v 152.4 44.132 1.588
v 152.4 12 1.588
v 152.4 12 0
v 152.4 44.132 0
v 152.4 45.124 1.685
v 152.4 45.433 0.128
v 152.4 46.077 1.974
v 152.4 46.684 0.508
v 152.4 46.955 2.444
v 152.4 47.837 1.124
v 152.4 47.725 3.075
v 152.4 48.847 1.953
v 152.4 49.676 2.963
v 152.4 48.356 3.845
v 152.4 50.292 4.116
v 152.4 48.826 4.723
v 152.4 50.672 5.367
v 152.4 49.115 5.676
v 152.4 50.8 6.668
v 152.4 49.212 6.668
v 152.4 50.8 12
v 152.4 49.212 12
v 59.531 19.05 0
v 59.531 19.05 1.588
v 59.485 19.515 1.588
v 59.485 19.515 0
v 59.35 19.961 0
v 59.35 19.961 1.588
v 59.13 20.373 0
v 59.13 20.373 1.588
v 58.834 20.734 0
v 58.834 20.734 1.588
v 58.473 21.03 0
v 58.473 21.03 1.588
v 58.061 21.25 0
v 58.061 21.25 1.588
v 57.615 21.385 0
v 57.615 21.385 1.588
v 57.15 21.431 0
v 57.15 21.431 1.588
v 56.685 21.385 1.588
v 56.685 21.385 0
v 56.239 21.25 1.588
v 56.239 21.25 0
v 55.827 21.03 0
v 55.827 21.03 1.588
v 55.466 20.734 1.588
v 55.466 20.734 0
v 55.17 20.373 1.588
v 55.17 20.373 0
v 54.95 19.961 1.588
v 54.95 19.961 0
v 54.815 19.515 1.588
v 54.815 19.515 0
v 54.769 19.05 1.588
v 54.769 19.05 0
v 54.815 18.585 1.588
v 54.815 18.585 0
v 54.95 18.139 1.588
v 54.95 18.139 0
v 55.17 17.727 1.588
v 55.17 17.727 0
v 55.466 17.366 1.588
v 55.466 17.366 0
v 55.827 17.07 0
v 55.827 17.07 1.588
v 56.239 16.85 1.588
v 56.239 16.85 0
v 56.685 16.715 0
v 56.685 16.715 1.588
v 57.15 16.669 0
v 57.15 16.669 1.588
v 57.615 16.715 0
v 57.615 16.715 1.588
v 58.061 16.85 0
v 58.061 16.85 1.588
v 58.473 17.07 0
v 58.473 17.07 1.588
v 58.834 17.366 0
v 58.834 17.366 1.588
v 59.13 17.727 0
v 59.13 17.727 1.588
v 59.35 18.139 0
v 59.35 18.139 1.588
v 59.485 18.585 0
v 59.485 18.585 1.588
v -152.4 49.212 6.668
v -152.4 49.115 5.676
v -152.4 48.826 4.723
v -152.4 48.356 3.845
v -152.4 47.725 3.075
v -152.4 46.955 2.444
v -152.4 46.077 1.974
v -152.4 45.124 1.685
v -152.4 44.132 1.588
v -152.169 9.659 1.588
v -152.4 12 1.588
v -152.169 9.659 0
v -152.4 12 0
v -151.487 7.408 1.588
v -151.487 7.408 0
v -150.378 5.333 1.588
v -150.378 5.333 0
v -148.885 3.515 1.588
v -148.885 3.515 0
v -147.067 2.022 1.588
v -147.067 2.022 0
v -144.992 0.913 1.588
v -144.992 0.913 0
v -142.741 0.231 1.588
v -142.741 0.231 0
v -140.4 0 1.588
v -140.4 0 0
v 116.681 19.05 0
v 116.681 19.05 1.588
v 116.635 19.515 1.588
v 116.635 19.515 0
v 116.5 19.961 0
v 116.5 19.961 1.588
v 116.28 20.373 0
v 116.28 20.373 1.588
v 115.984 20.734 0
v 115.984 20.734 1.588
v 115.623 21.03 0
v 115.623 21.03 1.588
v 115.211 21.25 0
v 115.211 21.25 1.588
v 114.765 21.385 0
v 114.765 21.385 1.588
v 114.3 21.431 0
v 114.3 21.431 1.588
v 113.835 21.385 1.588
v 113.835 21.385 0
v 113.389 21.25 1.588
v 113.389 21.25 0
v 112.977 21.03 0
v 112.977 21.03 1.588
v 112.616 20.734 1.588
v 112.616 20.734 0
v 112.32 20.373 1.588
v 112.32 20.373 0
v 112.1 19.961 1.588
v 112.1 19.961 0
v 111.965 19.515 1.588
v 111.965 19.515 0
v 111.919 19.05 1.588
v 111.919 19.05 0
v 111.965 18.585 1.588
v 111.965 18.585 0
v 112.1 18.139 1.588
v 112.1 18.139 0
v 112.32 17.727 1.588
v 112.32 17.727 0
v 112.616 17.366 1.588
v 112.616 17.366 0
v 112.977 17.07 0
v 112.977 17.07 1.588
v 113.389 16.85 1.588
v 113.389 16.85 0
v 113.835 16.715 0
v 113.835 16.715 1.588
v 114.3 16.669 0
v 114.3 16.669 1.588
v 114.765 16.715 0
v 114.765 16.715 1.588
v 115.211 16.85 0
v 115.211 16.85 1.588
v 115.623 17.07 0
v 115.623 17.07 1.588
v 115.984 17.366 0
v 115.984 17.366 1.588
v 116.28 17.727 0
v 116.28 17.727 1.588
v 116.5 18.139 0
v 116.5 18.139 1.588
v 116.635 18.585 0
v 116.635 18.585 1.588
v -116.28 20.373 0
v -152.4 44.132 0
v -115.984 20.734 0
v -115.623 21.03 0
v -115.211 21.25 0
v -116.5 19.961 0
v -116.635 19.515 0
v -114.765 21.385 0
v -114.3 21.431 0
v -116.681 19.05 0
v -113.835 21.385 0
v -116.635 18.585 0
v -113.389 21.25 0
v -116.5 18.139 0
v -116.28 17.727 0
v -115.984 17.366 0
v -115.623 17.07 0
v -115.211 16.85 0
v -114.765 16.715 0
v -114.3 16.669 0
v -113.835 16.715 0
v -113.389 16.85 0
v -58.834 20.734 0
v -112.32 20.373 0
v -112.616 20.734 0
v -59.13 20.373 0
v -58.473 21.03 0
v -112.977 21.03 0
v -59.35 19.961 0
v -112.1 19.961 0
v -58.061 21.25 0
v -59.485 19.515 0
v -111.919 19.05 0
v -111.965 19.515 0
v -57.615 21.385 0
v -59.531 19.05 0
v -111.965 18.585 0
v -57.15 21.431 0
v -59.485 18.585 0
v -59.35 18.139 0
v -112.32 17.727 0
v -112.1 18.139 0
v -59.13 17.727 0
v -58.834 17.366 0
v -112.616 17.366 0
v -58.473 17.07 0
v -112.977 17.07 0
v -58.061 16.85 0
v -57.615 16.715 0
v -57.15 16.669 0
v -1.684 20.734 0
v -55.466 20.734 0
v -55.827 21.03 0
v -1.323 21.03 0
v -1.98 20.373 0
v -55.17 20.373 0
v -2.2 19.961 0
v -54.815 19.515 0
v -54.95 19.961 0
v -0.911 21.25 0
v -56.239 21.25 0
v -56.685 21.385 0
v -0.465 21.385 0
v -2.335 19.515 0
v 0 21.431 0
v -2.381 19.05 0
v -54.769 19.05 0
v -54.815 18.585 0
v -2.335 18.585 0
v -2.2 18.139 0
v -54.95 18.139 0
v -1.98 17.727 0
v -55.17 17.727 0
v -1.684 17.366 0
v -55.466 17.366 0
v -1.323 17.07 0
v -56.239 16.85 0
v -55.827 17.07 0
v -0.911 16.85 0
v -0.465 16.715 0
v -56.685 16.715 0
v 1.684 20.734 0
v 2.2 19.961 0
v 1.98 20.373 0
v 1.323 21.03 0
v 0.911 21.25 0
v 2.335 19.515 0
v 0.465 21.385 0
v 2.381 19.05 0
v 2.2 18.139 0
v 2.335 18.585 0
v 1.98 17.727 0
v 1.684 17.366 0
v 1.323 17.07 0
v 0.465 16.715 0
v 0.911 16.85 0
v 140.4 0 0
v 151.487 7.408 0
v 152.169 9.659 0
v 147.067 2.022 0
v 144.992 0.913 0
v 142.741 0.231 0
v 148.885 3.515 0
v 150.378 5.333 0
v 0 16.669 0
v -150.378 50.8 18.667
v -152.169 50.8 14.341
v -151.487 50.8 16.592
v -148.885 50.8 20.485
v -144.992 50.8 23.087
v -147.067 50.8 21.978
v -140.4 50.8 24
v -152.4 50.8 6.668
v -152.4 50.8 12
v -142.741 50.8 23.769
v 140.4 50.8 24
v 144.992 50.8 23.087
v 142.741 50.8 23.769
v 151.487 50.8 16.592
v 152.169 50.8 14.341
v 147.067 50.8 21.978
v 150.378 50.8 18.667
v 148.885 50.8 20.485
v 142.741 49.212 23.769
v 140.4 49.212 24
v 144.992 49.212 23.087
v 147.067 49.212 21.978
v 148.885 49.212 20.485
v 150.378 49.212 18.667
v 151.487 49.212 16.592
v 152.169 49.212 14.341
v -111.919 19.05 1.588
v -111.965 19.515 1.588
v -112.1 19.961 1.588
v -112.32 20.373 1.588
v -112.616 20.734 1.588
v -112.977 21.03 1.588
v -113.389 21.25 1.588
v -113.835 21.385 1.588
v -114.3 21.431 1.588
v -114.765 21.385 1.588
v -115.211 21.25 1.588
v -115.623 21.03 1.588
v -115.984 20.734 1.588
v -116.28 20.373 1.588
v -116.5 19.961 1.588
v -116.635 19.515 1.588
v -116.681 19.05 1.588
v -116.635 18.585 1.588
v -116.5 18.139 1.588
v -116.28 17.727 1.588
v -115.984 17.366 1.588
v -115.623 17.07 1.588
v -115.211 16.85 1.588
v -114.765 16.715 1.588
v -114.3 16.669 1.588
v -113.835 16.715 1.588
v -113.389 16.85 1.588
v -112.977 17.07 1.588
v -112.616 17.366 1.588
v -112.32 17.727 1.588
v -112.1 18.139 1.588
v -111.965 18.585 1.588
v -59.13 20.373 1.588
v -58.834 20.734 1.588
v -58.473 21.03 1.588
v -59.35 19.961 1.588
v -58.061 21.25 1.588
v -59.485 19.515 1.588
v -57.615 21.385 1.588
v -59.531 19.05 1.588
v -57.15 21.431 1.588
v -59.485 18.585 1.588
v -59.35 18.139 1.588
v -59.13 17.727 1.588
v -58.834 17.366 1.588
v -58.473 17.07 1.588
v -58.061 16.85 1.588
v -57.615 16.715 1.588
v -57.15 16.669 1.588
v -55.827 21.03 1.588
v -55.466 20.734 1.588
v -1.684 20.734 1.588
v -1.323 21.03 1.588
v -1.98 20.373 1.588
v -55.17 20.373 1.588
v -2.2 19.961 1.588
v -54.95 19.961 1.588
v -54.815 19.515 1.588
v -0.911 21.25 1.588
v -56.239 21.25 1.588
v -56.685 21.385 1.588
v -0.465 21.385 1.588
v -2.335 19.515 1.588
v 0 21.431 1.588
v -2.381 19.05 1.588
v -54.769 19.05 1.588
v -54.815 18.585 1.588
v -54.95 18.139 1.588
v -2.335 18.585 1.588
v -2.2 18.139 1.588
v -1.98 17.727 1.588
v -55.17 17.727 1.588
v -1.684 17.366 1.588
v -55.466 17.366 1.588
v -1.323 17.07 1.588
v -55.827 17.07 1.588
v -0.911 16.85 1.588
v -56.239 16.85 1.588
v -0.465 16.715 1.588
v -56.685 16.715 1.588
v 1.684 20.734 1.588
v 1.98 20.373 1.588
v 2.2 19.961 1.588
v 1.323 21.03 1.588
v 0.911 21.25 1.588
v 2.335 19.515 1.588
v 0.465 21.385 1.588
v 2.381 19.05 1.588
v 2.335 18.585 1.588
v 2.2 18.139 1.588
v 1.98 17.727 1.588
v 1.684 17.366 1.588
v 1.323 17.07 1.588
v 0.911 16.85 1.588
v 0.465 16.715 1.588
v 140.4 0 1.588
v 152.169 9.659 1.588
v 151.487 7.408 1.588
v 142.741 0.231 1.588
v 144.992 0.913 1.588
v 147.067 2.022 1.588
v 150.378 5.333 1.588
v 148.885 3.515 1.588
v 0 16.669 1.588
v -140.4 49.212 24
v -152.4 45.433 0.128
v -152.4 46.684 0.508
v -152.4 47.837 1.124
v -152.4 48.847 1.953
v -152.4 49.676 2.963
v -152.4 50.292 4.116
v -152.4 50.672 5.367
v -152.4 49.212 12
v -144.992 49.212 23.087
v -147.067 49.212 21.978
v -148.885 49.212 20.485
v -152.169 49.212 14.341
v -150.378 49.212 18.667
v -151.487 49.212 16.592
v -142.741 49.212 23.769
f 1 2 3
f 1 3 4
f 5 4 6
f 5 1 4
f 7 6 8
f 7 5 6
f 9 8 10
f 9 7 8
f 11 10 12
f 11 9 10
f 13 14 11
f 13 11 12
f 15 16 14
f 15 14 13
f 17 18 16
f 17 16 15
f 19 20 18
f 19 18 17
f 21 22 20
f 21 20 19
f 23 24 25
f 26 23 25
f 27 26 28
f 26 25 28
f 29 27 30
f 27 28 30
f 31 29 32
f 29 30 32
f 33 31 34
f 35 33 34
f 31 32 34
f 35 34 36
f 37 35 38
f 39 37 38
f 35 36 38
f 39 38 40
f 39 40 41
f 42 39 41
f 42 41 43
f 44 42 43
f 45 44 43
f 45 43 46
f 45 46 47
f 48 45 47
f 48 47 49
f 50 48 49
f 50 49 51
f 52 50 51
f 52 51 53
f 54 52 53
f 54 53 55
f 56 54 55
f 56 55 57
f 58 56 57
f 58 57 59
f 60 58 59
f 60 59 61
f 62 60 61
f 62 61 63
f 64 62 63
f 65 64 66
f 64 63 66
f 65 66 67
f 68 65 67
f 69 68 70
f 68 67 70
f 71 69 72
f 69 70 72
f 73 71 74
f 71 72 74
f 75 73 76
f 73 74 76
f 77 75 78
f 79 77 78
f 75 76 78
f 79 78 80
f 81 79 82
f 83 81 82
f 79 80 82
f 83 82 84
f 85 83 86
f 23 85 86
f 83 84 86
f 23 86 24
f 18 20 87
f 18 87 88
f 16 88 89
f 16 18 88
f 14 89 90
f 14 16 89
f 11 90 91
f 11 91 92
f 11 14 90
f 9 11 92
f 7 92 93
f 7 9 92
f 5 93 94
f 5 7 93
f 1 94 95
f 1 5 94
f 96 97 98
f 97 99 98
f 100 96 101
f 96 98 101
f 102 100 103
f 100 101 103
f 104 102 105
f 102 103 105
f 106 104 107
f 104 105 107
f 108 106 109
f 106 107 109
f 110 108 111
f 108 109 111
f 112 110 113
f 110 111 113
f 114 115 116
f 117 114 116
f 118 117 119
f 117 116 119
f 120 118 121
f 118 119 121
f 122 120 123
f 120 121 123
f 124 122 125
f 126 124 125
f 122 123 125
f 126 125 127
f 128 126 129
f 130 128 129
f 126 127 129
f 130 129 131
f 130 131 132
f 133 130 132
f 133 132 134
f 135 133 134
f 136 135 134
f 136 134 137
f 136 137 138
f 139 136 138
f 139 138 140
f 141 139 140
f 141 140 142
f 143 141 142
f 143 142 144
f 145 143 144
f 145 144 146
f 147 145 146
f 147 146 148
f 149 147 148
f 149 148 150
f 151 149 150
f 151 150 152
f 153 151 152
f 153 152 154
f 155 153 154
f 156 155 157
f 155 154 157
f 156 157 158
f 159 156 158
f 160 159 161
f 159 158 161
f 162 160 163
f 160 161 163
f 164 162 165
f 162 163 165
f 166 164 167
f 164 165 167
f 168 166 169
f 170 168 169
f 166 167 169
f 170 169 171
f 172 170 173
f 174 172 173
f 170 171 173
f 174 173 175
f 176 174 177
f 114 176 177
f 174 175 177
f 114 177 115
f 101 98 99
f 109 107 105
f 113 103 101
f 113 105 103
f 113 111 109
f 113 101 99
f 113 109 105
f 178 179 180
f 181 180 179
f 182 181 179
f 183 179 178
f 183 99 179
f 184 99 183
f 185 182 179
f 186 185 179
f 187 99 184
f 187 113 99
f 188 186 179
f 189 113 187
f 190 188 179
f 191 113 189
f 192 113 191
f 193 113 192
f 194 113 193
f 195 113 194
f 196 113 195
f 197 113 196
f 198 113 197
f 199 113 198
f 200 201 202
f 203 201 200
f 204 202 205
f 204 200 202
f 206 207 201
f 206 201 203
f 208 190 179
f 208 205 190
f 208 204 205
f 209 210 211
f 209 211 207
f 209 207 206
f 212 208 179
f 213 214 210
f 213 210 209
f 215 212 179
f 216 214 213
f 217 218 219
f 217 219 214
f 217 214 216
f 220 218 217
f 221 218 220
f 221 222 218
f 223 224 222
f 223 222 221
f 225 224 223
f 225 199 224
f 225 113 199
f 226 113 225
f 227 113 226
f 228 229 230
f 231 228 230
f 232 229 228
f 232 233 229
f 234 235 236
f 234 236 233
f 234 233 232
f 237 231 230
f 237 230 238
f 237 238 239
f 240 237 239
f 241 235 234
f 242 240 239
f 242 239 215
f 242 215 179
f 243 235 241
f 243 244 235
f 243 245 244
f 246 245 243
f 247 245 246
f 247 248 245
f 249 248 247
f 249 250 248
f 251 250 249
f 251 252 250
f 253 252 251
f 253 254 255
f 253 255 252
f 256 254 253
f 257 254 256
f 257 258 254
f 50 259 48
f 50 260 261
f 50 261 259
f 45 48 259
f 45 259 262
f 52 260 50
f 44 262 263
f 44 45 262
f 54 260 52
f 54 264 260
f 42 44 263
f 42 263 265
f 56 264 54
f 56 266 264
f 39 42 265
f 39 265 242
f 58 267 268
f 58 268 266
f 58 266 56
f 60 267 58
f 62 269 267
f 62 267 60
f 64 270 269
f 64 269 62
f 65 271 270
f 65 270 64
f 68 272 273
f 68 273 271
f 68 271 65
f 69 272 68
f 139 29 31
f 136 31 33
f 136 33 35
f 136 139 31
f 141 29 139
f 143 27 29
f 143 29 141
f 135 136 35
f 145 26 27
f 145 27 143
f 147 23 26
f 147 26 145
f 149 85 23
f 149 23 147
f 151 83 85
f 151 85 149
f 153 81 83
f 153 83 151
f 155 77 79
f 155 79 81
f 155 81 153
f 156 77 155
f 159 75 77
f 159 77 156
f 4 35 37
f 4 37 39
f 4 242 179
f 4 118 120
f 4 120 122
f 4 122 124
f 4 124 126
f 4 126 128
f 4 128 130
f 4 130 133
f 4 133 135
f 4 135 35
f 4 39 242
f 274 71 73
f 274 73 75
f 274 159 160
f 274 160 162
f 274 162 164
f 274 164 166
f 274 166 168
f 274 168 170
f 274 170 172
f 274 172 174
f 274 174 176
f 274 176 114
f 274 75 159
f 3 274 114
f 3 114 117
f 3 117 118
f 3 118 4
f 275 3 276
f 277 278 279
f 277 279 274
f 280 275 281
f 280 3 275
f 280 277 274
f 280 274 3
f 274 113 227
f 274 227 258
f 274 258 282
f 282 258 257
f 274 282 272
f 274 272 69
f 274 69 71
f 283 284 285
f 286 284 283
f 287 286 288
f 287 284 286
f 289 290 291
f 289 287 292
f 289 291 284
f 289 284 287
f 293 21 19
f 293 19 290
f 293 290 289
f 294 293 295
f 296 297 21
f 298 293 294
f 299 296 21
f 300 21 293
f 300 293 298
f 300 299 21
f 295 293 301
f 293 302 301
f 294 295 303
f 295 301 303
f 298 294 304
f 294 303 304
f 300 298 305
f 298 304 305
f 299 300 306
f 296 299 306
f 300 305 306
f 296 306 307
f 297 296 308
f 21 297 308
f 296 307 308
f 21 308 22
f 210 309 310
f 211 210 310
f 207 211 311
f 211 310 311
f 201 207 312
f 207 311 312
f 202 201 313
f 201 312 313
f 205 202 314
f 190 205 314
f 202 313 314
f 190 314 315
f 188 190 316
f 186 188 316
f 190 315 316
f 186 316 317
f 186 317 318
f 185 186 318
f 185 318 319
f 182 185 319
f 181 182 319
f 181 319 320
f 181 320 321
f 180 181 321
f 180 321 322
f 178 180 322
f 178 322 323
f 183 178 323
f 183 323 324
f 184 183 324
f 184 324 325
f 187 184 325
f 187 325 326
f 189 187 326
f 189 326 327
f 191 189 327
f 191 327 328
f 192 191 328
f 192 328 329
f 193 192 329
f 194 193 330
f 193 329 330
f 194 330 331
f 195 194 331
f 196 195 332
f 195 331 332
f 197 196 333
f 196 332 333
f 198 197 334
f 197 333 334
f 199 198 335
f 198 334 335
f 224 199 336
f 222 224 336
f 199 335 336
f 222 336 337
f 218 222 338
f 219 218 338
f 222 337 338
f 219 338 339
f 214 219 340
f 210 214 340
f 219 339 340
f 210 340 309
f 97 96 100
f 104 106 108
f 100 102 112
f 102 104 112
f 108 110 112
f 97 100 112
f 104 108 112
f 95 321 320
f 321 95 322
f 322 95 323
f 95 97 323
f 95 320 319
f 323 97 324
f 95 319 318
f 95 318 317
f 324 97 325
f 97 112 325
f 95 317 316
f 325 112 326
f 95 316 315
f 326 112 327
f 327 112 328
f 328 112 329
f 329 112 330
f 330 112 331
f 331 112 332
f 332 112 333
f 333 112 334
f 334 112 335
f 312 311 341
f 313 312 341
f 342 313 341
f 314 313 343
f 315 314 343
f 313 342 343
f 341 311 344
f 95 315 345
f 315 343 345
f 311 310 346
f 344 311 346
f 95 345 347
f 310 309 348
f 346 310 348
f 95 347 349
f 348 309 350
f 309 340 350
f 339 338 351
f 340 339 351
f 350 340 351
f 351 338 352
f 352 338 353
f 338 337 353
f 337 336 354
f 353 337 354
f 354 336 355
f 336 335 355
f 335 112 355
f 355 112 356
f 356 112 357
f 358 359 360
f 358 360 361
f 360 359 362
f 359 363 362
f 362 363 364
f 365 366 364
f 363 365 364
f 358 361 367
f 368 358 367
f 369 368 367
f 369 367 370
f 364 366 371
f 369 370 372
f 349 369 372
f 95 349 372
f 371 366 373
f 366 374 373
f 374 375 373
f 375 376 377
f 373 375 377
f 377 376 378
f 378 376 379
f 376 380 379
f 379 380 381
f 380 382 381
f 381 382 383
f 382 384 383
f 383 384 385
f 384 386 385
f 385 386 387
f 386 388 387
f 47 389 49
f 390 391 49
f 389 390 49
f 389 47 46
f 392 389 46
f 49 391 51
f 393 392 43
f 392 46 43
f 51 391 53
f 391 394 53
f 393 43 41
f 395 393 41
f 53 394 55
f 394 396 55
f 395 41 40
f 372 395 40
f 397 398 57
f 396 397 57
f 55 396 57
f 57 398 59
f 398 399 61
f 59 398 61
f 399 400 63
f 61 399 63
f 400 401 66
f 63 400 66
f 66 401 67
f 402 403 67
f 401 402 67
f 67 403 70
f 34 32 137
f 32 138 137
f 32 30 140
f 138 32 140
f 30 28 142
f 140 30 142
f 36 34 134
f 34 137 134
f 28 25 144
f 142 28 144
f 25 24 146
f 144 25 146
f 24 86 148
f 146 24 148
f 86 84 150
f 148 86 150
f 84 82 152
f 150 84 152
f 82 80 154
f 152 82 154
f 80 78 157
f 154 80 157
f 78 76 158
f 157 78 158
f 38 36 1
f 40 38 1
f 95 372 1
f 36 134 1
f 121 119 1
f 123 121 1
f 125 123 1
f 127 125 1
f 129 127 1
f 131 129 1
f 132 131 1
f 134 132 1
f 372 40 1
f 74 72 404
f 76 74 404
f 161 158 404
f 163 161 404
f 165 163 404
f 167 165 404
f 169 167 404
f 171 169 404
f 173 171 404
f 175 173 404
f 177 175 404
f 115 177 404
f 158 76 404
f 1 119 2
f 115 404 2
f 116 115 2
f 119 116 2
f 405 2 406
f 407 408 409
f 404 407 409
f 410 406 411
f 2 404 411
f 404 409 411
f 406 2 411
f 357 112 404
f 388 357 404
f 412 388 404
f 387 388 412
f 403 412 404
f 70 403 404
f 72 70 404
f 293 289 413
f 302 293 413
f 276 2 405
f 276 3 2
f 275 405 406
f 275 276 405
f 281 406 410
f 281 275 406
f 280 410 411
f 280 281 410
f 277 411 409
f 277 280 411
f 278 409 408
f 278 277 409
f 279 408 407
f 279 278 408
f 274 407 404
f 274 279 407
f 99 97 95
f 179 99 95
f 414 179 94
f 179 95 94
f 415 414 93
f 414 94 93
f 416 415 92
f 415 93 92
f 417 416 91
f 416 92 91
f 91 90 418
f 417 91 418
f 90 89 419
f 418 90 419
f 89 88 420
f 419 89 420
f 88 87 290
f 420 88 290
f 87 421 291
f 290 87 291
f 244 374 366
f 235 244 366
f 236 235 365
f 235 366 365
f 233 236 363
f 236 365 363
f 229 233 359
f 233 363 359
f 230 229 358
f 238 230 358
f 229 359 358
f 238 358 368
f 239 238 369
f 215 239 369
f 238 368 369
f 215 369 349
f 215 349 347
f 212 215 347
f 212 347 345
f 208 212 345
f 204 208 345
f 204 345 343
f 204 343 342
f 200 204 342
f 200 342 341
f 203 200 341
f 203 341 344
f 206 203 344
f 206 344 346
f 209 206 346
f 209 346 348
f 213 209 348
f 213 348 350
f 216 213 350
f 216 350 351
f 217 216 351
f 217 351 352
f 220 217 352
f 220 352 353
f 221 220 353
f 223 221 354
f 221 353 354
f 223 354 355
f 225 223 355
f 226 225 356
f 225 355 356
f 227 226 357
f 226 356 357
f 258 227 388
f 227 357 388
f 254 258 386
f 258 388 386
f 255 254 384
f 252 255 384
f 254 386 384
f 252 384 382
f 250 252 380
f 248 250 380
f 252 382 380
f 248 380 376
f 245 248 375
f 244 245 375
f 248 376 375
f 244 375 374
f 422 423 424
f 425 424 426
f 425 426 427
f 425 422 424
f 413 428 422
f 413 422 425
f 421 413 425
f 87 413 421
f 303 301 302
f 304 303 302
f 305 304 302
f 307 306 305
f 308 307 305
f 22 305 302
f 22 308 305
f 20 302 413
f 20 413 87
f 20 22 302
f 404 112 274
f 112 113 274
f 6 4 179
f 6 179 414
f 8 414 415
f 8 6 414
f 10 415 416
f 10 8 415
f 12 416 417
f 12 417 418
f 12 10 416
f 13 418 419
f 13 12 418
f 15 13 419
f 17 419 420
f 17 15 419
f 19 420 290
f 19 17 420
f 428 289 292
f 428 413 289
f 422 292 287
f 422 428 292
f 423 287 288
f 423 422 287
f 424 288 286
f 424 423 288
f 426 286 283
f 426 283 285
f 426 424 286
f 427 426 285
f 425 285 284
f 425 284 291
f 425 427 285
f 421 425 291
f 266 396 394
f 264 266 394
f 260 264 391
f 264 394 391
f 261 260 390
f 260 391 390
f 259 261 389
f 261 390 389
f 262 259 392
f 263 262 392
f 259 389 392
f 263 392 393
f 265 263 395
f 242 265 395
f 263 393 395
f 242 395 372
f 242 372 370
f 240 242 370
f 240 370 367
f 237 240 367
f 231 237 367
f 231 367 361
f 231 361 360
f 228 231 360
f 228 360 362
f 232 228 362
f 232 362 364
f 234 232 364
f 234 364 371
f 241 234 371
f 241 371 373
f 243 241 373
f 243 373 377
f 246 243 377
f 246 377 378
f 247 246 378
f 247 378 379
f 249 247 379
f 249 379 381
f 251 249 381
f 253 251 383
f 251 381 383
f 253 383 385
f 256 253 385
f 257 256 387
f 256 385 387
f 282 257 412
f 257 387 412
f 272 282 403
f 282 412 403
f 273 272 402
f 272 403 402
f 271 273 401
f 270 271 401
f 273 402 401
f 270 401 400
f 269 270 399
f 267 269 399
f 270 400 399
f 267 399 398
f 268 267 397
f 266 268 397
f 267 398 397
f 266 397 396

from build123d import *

# Parameters (mm, degrees)
SKETCH1_W                    = 304.8
SKETCH1_H                    = 1.5875
BASE_FLANGE1_DEPTH           = 50.8
EDGE_FLANGE1_STRIP_W         = 16.51
EDGE_FLANGE1_STRIP_H         = 1.5875
EDGE_FLANGE1_STRIP_CUT_DEPTH = 304.8
EDGE_FLANGE1_DEPTH           = 304.8
SKETCH10_R                   = 2.38125
CUT_EXTRUDE1_DEPTH           = 163.199630568
FILLET1_R                    = 12


# Sheet-metal steps are written as plain solids
with BuildPart() as part:
    # Sketch1 → Base-Flange1 (new body)
    with BuildSketch(Plane(origin=(0, 0, 0), x_dir=(1, 0, 0), z_dir=(0, 1, 0))):
        with Locations((0, -0.79375)):
            Rectangle(SKETCH1_W, SKETCH1_H)
    extrude(amount=BASE_FLANGE1_DEPTH)

    # Edge-Flange1 strip (across the edge) → Edge-Flange1 strip cut (cut)
    with BuildSketch(Plane(origin=(152.4, 50.8, 1.5875), x_dir=(0, -1, 0), z_dir=(-1, 0, 0))):
        with Locations((-1.5875, -0.79375)):
            Rectangle(EDGE_FLANGE1_STRIP_W, EDGE_FLANGE1_STRIP_H)
    extrude(amount=EDGE_FLANGE1_STRIP_CUT_DEPTH, mode=Mode.SUBTRACT)

    # Edge-Flange1 section (across the edge) → Edge-Flange1 (add)
    with BuildSketch(Plane(origin=(152.4, 50.8, 1.5875), x_dir=(0, -1, 0), z_dir=(-1, 0, 0))):
        with BuildLine():
            Line((0, 5.08), (0, 22.4125))
            Line((0, 22.4125), (1.5875, 22.4125))
            Line((1.5875, 22.4125), (1.5875, 5.08))
            ThreePointArc((1.5875, 5.08), (3.075397552, 1.487897552), (6.6675, 0))
            Line((6.6675, 0), (6.6675, -1.5875))
            ThreePointArc((6.6675, -1.5875), (1.952865536, 0.365365536), (0, 5.08))
        make_face()
    extrude(amount=EDGE_FLANGE1_DEPTH)

    # Sketch10 → Cut-Extrude1 (cut, through all)
    with BuildSketch(Plane.XY.offset(1.5875)):
        with Locations((-114.3, 19.05)):
            Circle(SKETCH10_R)
        with Locations((114.3, 19.05)):
            Circle(SKETCH10_R)
        with Locations((0, 19.05)):
            Circle(SKETCH10_R)
        with Locations((57.15, 19.05)):
            Circle(SKETCH10_R)
        with Locations((-57.15, 19.05)):
            Circle(SKETCH10_R)
    extrude(amount=-CUT_EXTRUDE1_DEPTH, mode=Mode.SUBTRACT)

    # Fillet1
    fillet1_edges = [part.edges().sort_by_distance(p)[0] for p in [
        (152.4, 50.00625, 24),
        (-152.4, 50.00625, 24),
        (-152.4, 0, 0.79375),
        (152.4, 0, 0.79375),
    ]]
    fillet(fillet1_edges, radius=FILLET1_R)


solid = part.part
